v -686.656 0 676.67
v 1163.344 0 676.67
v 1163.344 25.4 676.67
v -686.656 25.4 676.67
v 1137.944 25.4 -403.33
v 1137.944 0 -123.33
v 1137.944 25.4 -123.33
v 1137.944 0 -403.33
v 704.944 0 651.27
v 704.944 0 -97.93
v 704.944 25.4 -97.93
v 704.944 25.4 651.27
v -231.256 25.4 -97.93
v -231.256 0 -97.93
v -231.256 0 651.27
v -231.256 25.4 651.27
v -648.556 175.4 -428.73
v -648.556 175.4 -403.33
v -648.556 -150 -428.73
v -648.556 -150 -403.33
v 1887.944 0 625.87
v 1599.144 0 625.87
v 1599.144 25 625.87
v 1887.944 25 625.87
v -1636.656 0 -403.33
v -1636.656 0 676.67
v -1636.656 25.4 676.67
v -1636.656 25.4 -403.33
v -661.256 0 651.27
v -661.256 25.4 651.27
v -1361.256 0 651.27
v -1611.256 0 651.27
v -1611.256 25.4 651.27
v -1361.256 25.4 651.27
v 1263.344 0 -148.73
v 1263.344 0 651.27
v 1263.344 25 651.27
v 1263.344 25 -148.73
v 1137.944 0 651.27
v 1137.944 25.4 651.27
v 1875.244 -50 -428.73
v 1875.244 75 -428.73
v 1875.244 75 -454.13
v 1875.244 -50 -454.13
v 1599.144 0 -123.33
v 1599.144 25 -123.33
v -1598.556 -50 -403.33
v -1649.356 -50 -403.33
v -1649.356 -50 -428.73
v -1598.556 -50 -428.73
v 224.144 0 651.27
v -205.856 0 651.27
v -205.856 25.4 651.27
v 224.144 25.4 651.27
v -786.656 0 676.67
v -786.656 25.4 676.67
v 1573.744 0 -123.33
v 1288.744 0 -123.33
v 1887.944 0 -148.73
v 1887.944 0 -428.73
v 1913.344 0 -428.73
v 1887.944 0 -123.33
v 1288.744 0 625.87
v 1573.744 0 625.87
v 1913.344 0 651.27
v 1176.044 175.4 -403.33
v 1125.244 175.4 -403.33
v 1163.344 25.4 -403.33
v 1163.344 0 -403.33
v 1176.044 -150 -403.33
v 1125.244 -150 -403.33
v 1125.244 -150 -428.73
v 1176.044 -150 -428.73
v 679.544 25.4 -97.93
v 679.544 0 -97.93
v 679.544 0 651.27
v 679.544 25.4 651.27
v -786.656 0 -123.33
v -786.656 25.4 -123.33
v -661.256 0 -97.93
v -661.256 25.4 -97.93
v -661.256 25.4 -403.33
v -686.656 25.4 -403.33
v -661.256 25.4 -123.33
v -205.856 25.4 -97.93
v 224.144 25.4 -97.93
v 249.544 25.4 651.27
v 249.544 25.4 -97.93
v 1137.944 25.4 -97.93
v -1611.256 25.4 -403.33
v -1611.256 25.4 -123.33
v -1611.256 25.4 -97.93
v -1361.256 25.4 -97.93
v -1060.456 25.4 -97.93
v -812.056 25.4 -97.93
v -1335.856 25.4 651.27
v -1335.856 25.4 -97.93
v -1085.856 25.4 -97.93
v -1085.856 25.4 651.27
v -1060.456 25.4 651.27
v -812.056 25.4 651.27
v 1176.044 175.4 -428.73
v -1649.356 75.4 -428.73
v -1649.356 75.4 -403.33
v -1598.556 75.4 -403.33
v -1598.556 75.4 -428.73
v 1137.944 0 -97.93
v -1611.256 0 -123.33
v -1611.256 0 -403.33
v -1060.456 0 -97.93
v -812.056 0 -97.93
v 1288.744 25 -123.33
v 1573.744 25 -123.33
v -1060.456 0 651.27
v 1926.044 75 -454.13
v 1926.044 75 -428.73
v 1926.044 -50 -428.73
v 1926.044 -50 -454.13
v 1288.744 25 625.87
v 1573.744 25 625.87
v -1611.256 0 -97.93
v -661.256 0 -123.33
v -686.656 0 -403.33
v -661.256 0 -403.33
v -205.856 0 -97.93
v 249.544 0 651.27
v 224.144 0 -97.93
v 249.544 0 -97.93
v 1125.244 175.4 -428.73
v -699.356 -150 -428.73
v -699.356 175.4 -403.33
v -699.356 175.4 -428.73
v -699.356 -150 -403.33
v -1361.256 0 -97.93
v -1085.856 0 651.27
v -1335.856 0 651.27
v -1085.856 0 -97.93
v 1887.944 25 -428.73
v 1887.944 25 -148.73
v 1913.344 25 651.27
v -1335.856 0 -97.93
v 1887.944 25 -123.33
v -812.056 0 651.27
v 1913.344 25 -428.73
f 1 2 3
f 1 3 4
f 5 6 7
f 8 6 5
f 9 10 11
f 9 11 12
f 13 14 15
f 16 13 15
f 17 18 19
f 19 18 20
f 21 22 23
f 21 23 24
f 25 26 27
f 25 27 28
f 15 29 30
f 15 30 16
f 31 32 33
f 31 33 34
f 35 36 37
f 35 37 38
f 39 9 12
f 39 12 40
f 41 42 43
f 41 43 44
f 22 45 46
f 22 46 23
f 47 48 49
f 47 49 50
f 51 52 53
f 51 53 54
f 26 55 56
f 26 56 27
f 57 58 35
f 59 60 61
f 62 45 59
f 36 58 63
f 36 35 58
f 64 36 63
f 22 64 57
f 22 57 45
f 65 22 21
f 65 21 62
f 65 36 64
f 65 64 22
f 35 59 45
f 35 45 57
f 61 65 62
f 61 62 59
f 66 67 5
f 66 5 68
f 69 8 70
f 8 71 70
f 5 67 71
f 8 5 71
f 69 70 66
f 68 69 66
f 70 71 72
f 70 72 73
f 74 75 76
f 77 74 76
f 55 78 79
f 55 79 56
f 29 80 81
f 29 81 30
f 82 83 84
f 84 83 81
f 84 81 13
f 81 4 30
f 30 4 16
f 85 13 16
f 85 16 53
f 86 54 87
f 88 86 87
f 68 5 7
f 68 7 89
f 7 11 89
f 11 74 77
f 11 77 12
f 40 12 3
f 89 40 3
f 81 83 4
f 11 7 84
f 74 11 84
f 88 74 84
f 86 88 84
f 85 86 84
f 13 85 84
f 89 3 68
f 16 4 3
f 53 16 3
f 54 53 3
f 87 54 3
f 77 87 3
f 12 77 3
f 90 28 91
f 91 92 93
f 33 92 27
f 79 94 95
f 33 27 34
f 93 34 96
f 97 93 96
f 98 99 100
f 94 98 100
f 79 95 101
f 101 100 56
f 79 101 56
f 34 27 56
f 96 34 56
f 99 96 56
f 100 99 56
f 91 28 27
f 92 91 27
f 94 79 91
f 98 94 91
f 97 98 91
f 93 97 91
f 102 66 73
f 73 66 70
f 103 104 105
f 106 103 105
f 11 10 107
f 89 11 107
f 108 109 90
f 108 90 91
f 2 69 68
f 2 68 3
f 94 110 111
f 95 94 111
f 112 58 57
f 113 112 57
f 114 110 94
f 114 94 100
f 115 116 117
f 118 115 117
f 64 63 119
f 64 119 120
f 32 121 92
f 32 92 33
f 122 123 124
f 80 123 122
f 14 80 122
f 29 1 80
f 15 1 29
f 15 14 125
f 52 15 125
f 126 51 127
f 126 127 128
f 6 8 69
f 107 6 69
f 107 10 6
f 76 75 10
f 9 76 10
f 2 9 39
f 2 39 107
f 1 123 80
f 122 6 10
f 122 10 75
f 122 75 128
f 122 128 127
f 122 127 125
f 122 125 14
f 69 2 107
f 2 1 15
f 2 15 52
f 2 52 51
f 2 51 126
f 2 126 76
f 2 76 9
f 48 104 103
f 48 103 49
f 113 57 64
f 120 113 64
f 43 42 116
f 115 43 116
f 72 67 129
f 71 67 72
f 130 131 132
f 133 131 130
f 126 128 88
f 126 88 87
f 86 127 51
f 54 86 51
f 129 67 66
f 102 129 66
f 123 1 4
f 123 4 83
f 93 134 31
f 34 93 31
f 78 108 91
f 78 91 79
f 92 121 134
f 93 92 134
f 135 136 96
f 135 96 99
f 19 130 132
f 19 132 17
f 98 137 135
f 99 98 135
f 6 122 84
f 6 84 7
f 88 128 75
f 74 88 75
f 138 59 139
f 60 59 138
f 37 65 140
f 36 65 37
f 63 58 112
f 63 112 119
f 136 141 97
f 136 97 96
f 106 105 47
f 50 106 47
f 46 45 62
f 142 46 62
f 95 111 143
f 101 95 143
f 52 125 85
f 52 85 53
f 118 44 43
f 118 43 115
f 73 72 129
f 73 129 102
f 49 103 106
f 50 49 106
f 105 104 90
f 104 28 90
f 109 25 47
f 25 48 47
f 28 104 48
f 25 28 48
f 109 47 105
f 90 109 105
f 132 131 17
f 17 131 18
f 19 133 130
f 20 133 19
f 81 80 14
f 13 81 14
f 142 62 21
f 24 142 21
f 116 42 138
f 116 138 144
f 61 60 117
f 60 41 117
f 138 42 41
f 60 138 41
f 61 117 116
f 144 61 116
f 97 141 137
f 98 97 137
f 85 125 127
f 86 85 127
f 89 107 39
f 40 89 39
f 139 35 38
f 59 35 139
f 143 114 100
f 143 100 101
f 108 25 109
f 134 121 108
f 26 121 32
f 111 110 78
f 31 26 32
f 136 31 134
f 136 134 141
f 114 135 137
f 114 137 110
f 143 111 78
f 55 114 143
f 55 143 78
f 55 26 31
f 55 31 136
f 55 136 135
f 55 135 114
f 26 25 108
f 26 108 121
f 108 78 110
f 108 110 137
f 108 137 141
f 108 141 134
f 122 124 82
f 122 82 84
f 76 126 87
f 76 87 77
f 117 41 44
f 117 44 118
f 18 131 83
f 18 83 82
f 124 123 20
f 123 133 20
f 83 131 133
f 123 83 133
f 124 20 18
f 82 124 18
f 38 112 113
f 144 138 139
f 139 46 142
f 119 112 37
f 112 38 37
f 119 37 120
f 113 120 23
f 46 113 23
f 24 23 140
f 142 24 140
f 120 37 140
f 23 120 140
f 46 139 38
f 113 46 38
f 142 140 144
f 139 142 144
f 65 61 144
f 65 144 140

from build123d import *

# Parameters (mm, degrees)
F1_DEPTH  = 25.4
F2_W      = 430
F2_H      = 749.2
F2_W_2    = 433
F3_DEPTH  = 25.4
F4_W      = 50.8
F4_H      = 325.4
F5_DEPTH  = 25.4
F7_DEPTH  = 25
F8_W      = 285
F8_H      = 749.2
F8_W_2    = 288.8
F9_DEPTH  = 26
F10_W     = 250
F10_H     = 749.2
F10_W_2   = 248.4
F11_DEPTH = 25.4
F12_W     = 50.8
F12_H     = 125
F13_DEPTH = 25.4
F14_W     = 50.8
F14_H     = 125.4
F15_DEPTH = 25.4


with BuildPart() as f1:
    # F0 (on Front) → F1 (new body)
    with BuildSketch(Plane.XZ):
        Polygon((-686.656185, 676.669861), (-686.656185, -403.330139), (-661.256185, -403.330139), (-661.256185, -123.330139), (1137.943815, -123.330139), (1137.943815, -403.330139), (1163.343815, -403.330139), (1163.343815, 676.669861), align=None)
    extrude(amount=-F1_DEPTH)

    # F2 (on face) → F3 (cut)
    with BuildSketch(Plane.XZ):
        with Locations((9.143815, 276.669861)):
            Rectangle(F2_W, F2_H)
        with Locations((464.543815, 276.669861)):
            Rectangle(F2_W, F2_H)
        with Locations((921.443815, 276.669861)):
            Rectangle(F2_W_2, F2_H)
        with Locations((-446.256185, 276.669861)):
            Rectangle(F2_W, F2_H)
    extrude(amount=-F3_DEPTH, mode=Mode.SUBTRACT)

    # F4 (on face) → F5 (join)
    with BuildSketch(Plane(origin=(0, 0, -403.330139), x_dir=(1, 0, 0), z_dir=(0, 0, -1))):
        with Locations((1150.643815, -12.7)):
            Rectangle(F4_W, F4_H)
        with Locations((-673.956185, -12.7)):
            Rectangle(F4_W, F4_H)
    extrude(amount=F5_DEPTH)


with BuildPart() as f7:
    # F6 (on face) → F7 (new body)
    with BuildSketch(Plane.XZ):
        Polygon((1913.343815, 651.269861), (1263.343815, 651.269861), (1263.343815, -148.730139), (1887.943815, -148.730139), (1887.943815, -428.730139), (1913.343815, -428.730139), align=None)
    extrude(amount=-F7_DEPTH)

    # F8 (on face) → F9 (cut)
    with BuildSketch(Plane.XZ):
        with Locations((1431.243815, 251.269861)):
            Rectangle(F8_W, F8_H)
        with Locations((1743.543815, 251.269861)):
            Rectangle(F8_W_2, F8_H)
    extrude(amount=-F9_DEPTH, mode=Mode.SUBTRACT)

    # F12 (on face) → F13 (join)
    with BuildSketch(Plane(origin=(0, 0, -428.730139), x_dir=(1, 0, 0), z_dir=(0, 0, -1))):
        with Locations((1900.643815, -12.5)):
            Rectangle(F12_W, F12_H)
    extrude(amount=F13_DEPTH)


with BuildPart() as f11:
    # F10 (on face) → F11 (new body)
    with BuildSketch(Plane.XZ):
        Polygon((-786.656185, -123.330139), (-786.656185, 676.669861), (-1636.656185, 676.669861), (-1636.656185, -403.330139), (-1611.256185, -403.330139), (-1611.256185, -123.330139), align=None)
        with Locations((-1486.256185, 276.669861)):
            Rectangle(F10_W, F10_H, mode=Mode.SUBTRACT)
        with Locations((-1210.856185, 276.669861)):
            Rectangle(F10_W, F10_H, mode=Mode.SUBTRACT)
        with Locations((-936.256185, 276.669861)):
            Rectangle(F10_W_2, F10_H, mode=Mode.SUBTRACT)
    extrude(amount=-F11_DEPTH)

    # F14 (on face) → F15 (join)
    with BuildSketch(Plane(origin=(0, 0, -403.330139), x_dir=(1, 0, 0), z_dir=(0, 0, -1))):
        with Locations((-1623.956185, -12.7)):
            Rectangle(F14_W, F14_H)
    extrude(amount=F15_DEPTH)


solid = Compound([f1.part, f7.part, f11.part])
